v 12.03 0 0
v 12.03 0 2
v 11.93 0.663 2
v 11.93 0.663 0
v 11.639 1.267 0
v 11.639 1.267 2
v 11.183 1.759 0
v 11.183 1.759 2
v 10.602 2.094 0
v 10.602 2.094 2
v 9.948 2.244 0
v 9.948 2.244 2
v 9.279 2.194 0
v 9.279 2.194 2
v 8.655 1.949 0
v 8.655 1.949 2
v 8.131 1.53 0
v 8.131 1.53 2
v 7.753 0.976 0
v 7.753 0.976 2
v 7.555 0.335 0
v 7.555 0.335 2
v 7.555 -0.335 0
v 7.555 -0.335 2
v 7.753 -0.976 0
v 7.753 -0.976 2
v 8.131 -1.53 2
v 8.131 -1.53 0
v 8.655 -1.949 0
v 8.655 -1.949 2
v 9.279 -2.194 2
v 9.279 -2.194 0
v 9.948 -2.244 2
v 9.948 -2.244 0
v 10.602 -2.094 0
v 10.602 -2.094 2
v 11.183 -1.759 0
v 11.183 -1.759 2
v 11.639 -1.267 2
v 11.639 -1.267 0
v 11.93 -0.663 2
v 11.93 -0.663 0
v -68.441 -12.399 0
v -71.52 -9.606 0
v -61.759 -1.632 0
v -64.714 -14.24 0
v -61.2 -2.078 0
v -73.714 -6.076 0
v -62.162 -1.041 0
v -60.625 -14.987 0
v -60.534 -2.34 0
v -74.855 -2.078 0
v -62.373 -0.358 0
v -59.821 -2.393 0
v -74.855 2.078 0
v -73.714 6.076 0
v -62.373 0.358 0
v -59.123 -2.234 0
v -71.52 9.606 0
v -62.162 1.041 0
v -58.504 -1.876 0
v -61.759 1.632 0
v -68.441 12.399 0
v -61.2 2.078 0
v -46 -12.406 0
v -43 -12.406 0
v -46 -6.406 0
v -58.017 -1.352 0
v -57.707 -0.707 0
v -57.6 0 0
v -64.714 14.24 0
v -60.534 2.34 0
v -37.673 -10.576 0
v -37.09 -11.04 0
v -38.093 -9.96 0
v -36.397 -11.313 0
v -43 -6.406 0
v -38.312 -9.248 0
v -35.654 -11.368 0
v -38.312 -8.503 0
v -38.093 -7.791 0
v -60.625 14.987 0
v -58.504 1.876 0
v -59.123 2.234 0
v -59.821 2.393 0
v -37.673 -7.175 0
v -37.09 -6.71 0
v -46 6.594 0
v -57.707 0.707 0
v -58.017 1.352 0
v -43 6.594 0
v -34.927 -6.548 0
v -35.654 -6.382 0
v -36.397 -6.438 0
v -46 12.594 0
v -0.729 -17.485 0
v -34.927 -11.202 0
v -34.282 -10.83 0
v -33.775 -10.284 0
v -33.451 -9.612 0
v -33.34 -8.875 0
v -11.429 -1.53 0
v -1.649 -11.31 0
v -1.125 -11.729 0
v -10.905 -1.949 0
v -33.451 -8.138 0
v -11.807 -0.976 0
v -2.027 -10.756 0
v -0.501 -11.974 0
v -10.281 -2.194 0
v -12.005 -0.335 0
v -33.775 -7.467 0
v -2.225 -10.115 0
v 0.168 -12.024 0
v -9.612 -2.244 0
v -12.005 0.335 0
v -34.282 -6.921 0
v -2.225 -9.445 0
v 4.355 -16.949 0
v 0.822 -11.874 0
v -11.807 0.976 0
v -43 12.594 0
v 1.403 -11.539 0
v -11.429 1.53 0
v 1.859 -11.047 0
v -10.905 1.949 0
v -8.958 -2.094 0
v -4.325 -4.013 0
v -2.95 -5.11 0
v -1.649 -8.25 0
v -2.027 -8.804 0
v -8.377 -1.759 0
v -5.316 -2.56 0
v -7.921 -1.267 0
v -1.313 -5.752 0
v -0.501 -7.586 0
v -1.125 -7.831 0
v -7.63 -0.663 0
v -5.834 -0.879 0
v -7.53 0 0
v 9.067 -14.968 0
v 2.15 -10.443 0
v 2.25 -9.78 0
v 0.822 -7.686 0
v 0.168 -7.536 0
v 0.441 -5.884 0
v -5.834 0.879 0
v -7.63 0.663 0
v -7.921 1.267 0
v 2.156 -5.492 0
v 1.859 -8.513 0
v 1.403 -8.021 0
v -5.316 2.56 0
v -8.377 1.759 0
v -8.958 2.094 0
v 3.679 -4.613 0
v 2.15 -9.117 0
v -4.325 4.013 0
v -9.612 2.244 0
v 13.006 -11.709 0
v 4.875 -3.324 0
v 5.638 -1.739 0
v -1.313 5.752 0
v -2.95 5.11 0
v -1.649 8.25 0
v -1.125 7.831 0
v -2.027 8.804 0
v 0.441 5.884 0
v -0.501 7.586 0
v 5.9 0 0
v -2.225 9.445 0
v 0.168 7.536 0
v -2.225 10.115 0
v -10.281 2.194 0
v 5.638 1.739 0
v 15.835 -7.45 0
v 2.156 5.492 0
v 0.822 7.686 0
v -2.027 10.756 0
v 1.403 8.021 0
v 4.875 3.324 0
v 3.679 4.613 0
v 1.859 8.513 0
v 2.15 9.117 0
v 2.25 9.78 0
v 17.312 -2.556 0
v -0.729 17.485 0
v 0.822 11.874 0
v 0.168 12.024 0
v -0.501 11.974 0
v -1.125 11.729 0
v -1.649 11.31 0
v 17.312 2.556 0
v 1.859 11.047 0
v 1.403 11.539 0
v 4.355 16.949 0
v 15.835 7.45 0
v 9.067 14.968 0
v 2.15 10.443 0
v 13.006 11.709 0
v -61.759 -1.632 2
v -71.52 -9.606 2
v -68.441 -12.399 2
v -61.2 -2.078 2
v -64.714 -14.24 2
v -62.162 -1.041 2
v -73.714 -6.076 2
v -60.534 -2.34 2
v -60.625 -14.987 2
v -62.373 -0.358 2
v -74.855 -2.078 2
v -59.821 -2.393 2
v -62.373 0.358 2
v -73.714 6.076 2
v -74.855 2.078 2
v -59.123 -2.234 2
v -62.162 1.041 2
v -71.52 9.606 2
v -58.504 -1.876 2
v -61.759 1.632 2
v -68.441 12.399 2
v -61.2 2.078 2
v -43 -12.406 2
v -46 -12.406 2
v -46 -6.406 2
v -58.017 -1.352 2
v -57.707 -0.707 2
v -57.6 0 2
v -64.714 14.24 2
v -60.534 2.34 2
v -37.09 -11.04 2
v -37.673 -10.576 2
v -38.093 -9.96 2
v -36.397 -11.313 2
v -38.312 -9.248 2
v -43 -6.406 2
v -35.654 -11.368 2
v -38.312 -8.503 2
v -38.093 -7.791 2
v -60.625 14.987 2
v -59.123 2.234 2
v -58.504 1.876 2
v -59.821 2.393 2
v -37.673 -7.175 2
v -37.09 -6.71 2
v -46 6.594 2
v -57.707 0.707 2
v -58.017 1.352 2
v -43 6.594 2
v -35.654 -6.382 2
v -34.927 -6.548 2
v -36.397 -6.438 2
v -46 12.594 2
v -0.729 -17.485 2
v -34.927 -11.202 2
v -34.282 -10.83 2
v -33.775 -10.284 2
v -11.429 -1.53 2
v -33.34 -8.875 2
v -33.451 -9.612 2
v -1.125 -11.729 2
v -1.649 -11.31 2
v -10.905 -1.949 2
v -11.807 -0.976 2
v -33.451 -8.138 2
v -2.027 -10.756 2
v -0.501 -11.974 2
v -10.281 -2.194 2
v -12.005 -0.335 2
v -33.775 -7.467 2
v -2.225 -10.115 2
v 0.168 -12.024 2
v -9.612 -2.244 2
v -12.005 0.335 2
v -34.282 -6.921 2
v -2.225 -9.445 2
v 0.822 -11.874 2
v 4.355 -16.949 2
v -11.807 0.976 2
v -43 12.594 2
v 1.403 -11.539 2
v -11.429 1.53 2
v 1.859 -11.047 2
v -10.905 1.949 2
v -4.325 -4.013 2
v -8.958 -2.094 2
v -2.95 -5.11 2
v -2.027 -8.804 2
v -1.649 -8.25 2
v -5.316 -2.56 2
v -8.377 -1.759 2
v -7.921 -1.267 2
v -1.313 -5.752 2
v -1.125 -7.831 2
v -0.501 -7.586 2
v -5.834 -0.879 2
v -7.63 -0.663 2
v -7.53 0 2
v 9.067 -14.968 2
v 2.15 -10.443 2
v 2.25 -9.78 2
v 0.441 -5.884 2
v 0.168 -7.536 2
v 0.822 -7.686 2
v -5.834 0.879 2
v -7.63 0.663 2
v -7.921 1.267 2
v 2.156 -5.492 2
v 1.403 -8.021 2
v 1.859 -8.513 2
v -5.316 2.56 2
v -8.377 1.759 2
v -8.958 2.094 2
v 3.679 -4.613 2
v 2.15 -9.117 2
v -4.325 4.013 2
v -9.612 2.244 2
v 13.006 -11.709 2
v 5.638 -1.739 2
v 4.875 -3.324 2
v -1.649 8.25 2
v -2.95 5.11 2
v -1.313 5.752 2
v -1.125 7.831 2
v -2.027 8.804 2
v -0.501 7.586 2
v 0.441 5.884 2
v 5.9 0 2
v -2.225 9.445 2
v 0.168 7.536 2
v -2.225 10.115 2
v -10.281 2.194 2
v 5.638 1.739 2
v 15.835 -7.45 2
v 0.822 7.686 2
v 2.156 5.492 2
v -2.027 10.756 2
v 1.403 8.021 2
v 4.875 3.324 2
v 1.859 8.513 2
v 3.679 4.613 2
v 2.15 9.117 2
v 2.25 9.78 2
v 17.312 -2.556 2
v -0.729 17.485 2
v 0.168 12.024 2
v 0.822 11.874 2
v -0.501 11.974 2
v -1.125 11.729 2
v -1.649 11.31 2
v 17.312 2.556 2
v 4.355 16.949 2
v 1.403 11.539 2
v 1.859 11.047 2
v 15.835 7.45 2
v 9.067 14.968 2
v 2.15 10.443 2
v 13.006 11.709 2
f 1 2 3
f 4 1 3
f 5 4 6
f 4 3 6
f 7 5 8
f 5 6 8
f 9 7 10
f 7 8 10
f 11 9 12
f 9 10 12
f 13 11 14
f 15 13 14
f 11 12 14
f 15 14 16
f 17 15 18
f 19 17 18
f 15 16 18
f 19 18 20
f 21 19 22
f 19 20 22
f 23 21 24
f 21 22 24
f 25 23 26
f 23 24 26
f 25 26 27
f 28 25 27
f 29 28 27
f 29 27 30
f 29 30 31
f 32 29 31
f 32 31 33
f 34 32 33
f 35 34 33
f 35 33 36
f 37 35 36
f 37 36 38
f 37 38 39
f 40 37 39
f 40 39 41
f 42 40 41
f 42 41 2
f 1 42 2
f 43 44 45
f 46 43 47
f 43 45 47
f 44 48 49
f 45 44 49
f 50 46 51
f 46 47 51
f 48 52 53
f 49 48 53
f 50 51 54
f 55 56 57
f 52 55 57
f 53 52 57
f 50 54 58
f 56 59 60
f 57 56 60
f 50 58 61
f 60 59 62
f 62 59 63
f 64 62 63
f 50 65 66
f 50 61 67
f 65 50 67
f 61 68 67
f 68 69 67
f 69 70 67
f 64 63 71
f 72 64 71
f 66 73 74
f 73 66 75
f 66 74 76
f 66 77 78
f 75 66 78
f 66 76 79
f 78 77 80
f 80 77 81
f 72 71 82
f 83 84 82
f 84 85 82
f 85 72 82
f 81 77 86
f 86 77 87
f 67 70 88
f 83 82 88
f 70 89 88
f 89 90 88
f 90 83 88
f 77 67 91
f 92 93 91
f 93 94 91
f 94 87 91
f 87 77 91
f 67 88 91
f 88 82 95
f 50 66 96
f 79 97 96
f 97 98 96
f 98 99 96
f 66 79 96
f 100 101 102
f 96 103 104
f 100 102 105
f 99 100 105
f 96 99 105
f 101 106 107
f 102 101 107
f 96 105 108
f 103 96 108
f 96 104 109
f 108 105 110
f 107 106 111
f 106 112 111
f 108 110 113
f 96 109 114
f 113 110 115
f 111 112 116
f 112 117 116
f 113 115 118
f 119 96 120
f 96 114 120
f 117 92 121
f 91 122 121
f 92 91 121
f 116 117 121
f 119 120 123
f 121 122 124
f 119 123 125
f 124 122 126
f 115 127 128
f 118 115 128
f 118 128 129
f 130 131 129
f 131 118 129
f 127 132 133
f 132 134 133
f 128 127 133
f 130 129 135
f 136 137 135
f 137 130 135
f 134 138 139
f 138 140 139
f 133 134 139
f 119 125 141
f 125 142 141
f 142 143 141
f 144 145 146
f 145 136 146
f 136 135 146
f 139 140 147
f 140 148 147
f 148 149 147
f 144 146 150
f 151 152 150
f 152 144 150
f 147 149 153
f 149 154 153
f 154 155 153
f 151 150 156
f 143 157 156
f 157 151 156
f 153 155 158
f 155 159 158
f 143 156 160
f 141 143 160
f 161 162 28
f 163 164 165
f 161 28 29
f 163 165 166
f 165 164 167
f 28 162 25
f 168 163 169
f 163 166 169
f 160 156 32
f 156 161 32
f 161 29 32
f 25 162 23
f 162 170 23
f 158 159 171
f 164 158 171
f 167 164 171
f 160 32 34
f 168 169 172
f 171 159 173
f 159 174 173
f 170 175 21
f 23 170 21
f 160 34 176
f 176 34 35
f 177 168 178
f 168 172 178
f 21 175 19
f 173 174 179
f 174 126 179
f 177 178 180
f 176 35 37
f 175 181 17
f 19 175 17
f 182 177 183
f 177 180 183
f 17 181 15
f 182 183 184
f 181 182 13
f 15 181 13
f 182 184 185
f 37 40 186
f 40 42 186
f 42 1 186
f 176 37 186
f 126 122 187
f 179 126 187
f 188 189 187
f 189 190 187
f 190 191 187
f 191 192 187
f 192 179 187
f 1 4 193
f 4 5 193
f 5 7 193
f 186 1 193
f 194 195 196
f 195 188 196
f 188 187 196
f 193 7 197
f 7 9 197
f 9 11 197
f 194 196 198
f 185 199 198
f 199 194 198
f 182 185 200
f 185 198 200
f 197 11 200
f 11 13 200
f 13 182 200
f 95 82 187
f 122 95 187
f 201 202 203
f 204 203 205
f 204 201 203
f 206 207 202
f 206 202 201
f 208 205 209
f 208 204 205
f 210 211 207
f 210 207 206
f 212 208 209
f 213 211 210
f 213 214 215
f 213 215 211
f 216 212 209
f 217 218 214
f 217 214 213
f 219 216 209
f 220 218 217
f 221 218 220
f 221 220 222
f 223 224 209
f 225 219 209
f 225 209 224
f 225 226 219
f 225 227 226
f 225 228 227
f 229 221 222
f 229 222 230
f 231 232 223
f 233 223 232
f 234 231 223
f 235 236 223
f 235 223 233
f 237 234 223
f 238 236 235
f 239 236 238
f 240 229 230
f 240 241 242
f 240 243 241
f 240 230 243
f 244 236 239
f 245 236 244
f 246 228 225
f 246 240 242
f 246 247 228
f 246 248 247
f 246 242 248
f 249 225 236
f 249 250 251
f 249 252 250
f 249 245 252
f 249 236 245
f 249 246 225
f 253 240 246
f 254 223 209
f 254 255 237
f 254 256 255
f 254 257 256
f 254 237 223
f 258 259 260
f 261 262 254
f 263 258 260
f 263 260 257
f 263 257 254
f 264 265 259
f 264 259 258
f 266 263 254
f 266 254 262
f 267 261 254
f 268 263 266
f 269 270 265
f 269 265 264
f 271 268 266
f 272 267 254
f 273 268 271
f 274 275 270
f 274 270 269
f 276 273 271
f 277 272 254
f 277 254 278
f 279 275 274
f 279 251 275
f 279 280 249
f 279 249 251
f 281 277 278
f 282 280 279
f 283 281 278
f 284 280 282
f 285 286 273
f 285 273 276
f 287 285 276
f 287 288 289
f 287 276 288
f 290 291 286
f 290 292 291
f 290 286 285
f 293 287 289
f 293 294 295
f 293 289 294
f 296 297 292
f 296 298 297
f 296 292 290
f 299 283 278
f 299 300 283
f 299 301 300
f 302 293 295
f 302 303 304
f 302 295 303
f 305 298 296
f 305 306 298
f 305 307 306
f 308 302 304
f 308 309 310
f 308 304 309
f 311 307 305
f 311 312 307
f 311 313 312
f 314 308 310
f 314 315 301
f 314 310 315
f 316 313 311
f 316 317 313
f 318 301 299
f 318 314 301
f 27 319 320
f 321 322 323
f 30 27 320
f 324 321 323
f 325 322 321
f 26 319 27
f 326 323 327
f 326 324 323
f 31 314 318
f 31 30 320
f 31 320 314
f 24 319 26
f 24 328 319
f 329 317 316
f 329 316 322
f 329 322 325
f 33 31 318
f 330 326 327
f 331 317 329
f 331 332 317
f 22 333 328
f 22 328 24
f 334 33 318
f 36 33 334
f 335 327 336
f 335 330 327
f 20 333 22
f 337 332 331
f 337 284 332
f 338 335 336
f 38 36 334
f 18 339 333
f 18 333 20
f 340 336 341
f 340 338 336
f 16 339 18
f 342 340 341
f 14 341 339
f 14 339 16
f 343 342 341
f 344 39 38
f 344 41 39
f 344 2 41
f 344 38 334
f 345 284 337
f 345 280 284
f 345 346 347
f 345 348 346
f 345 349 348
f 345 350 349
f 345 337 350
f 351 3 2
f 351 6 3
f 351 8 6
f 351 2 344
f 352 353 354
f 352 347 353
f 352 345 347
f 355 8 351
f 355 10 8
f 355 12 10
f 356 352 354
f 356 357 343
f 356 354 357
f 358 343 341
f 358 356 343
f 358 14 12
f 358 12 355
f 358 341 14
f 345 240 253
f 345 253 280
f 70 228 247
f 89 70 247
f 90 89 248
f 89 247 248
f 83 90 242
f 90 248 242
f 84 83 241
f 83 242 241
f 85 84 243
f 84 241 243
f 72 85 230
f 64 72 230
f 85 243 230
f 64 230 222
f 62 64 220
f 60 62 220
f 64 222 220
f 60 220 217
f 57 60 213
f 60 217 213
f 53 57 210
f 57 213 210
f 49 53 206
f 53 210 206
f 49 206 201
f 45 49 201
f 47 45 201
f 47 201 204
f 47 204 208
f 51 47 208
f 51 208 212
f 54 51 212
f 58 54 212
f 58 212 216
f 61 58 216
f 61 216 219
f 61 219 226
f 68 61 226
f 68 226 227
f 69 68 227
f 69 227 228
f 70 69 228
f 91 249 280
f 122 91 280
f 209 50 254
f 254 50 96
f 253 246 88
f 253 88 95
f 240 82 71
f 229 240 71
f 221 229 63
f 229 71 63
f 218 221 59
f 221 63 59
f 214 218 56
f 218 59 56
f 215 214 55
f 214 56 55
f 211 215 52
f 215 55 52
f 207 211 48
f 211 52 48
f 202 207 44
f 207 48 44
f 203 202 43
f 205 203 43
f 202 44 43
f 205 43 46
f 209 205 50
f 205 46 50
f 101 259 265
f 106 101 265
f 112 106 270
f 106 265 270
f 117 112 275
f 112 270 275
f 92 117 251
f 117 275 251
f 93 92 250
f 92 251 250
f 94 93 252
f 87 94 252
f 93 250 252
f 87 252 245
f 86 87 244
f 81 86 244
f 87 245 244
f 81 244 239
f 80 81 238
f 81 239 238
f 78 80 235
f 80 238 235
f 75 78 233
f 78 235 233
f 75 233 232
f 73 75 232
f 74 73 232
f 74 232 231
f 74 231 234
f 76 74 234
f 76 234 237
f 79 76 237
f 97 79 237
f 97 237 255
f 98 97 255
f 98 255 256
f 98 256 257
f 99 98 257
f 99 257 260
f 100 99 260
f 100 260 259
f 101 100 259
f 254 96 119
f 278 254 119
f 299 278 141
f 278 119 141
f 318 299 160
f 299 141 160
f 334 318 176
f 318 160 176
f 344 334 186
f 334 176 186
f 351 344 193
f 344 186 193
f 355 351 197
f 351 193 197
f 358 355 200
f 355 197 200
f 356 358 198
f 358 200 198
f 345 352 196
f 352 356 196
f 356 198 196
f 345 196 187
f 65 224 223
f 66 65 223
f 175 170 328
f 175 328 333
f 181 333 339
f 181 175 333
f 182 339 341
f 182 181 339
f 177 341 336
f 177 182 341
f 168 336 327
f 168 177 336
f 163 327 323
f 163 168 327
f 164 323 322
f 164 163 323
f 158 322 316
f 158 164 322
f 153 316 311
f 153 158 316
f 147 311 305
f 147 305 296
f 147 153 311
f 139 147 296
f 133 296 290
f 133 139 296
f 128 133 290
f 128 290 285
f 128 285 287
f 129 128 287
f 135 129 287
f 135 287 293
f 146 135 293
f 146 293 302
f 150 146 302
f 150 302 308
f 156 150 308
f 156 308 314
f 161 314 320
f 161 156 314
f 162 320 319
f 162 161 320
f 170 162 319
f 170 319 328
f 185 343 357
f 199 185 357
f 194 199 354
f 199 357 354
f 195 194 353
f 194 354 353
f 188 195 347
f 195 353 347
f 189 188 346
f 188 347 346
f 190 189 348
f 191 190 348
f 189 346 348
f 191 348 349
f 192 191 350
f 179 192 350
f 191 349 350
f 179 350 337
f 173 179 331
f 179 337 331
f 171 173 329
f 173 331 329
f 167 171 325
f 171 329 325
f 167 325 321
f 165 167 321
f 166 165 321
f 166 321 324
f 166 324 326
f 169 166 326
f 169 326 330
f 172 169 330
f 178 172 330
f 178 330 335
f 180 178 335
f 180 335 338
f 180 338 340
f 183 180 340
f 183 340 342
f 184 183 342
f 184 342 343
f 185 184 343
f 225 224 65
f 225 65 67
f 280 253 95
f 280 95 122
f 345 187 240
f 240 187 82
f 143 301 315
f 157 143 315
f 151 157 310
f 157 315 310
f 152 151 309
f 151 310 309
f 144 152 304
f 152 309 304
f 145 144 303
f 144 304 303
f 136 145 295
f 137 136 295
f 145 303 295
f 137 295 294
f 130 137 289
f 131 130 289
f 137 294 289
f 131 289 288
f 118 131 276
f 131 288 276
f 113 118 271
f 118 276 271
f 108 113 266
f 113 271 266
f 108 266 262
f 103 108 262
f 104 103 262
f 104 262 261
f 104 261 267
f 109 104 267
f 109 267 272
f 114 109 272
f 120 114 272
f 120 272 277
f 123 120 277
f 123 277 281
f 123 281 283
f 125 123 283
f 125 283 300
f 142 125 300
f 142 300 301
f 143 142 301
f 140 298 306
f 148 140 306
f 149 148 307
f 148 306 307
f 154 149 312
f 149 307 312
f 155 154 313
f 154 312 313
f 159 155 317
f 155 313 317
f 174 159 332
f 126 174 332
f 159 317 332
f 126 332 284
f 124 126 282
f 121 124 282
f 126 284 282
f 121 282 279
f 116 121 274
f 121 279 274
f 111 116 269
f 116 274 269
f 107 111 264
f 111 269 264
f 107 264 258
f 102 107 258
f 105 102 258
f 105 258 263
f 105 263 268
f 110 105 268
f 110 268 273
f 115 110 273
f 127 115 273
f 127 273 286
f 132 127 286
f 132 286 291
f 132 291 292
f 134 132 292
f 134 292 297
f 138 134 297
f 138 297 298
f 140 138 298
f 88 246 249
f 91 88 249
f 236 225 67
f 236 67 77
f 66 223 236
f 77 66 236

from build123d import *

# Parameters (mm, degrees)
SKETCH1_R           = 17.5
SKETCH1_R_2         = 5.9
SKETCH1_R_3         = 15
BOSS_EXTRUDE1_DEPTH = 2
SKETCH2_R           = 2.25
CUT_EXTRUDE1_DEPTH  = 78.040573726
SKETCH3_R           = 2.4
CUT_EXTRUDE2_DEPTH  = 78.040573726
SKETCH4_W           = 3
SKETCH4_H           = 6
CUT_EXTRUDE3_DEPTH  = 10
SKETCH5_R           = 2.5
CUT_EXTRUDE4_DEPTH  = 78.040573726


with BuildPart() as part:
    # Sketch1 → Boss-Extrude1 (new body)
    # profile 1 of 3: a face of its own
    with BuildSketch(Plane.XY):
        Circle(SKETCH1_R)
        Circle(SKETCH1_R_2, mode=Mode.SUBTRACT)
    # profile 2 of 3: a face of its own
    with BuildSketch(Plane.XY):
        with Locations((-60, 0)):
            Circle(SKETCH1_R_3)
    # profile 3 of 3: a face of its own
    with BuildSketch(Plane.XY):
        with BuildLine():
            Line((-0.729166667, 17.484802429), (-60.625, 14.98697351))
            ThreePointArc((-60.625, 14.98697351), (-49.616720171, 10.825317547), (-45, 0))
            ThreePointArc((-45, 0), (-49.616720171, -10.825317547), (-60.625, -14.98697351))
            Line((-60.625, -14.98697351), (-0.729166667, -17.484802429))
            ThreePointArc((-0.729166667, -17.484802429), (-17.5, 0), (-0.729166667, 17.484802429))
        make_face()
    extrude(amount=BOSS_EXTRUDE1_DEPTH)

    # Sketch2 → Cut-Extrude1 (cut, through all)
    with BuildSketch(Plane.XY.offset(2)):
        with Locations((0, 9.78)):
            Circle(SKETCH2_R)
        with Locations((9.78, 0)):
            Circle(SKETCH2_R)
        with Locations((0, -9.78)):
            Circle(SKETCH2_R)
        with Locations((-9.78, 0)):
            Circle(SKETCH2_R)
    extrude(amount=-CUT_EXTRUDE1_DEPTH, mode=Mode.SUBTRACT)

    # Sketch3 → Cut-Extrude2 (cut, through all)
    with BuildSketch(Plane.XY.offset(2)):
        with Locations((-60, 0)):
            Circle(SKETCH3_R)
    extrude(amount=-CUT_EXTRUDE2_DEPTH, mode=Mode.SUBTRACT)

    # Sketch4 → Cut-Extrude3 (cut)
    with BuildSketch(Plane.XY.offset(2)):
        with Locations((-44.5, -9.405729391)):
            Rectangle(SKETCH4_W, SKETCH4_H)
        with Locations((-44.5, 9.594270609)):
            Rectangle(SKETCH4_W, SKETCH4_H)
    extrude(amount=-CUT_EXTRUDE3_DEPTH, mode=Mode.SUBTRACT)

    # Sketch5 → Cut-Extrude4 (cut, through all)
    with BuildSketch(Plane.XY.offset(2)):
        with Locations((-35.840347269, -8.875222906)):
            Circle(SKETCH5_R)
    extrude(amount=-CUT_EXTRUDE4_DEPTH, mode=Mode.SUBTRACT)


solid = part.part
